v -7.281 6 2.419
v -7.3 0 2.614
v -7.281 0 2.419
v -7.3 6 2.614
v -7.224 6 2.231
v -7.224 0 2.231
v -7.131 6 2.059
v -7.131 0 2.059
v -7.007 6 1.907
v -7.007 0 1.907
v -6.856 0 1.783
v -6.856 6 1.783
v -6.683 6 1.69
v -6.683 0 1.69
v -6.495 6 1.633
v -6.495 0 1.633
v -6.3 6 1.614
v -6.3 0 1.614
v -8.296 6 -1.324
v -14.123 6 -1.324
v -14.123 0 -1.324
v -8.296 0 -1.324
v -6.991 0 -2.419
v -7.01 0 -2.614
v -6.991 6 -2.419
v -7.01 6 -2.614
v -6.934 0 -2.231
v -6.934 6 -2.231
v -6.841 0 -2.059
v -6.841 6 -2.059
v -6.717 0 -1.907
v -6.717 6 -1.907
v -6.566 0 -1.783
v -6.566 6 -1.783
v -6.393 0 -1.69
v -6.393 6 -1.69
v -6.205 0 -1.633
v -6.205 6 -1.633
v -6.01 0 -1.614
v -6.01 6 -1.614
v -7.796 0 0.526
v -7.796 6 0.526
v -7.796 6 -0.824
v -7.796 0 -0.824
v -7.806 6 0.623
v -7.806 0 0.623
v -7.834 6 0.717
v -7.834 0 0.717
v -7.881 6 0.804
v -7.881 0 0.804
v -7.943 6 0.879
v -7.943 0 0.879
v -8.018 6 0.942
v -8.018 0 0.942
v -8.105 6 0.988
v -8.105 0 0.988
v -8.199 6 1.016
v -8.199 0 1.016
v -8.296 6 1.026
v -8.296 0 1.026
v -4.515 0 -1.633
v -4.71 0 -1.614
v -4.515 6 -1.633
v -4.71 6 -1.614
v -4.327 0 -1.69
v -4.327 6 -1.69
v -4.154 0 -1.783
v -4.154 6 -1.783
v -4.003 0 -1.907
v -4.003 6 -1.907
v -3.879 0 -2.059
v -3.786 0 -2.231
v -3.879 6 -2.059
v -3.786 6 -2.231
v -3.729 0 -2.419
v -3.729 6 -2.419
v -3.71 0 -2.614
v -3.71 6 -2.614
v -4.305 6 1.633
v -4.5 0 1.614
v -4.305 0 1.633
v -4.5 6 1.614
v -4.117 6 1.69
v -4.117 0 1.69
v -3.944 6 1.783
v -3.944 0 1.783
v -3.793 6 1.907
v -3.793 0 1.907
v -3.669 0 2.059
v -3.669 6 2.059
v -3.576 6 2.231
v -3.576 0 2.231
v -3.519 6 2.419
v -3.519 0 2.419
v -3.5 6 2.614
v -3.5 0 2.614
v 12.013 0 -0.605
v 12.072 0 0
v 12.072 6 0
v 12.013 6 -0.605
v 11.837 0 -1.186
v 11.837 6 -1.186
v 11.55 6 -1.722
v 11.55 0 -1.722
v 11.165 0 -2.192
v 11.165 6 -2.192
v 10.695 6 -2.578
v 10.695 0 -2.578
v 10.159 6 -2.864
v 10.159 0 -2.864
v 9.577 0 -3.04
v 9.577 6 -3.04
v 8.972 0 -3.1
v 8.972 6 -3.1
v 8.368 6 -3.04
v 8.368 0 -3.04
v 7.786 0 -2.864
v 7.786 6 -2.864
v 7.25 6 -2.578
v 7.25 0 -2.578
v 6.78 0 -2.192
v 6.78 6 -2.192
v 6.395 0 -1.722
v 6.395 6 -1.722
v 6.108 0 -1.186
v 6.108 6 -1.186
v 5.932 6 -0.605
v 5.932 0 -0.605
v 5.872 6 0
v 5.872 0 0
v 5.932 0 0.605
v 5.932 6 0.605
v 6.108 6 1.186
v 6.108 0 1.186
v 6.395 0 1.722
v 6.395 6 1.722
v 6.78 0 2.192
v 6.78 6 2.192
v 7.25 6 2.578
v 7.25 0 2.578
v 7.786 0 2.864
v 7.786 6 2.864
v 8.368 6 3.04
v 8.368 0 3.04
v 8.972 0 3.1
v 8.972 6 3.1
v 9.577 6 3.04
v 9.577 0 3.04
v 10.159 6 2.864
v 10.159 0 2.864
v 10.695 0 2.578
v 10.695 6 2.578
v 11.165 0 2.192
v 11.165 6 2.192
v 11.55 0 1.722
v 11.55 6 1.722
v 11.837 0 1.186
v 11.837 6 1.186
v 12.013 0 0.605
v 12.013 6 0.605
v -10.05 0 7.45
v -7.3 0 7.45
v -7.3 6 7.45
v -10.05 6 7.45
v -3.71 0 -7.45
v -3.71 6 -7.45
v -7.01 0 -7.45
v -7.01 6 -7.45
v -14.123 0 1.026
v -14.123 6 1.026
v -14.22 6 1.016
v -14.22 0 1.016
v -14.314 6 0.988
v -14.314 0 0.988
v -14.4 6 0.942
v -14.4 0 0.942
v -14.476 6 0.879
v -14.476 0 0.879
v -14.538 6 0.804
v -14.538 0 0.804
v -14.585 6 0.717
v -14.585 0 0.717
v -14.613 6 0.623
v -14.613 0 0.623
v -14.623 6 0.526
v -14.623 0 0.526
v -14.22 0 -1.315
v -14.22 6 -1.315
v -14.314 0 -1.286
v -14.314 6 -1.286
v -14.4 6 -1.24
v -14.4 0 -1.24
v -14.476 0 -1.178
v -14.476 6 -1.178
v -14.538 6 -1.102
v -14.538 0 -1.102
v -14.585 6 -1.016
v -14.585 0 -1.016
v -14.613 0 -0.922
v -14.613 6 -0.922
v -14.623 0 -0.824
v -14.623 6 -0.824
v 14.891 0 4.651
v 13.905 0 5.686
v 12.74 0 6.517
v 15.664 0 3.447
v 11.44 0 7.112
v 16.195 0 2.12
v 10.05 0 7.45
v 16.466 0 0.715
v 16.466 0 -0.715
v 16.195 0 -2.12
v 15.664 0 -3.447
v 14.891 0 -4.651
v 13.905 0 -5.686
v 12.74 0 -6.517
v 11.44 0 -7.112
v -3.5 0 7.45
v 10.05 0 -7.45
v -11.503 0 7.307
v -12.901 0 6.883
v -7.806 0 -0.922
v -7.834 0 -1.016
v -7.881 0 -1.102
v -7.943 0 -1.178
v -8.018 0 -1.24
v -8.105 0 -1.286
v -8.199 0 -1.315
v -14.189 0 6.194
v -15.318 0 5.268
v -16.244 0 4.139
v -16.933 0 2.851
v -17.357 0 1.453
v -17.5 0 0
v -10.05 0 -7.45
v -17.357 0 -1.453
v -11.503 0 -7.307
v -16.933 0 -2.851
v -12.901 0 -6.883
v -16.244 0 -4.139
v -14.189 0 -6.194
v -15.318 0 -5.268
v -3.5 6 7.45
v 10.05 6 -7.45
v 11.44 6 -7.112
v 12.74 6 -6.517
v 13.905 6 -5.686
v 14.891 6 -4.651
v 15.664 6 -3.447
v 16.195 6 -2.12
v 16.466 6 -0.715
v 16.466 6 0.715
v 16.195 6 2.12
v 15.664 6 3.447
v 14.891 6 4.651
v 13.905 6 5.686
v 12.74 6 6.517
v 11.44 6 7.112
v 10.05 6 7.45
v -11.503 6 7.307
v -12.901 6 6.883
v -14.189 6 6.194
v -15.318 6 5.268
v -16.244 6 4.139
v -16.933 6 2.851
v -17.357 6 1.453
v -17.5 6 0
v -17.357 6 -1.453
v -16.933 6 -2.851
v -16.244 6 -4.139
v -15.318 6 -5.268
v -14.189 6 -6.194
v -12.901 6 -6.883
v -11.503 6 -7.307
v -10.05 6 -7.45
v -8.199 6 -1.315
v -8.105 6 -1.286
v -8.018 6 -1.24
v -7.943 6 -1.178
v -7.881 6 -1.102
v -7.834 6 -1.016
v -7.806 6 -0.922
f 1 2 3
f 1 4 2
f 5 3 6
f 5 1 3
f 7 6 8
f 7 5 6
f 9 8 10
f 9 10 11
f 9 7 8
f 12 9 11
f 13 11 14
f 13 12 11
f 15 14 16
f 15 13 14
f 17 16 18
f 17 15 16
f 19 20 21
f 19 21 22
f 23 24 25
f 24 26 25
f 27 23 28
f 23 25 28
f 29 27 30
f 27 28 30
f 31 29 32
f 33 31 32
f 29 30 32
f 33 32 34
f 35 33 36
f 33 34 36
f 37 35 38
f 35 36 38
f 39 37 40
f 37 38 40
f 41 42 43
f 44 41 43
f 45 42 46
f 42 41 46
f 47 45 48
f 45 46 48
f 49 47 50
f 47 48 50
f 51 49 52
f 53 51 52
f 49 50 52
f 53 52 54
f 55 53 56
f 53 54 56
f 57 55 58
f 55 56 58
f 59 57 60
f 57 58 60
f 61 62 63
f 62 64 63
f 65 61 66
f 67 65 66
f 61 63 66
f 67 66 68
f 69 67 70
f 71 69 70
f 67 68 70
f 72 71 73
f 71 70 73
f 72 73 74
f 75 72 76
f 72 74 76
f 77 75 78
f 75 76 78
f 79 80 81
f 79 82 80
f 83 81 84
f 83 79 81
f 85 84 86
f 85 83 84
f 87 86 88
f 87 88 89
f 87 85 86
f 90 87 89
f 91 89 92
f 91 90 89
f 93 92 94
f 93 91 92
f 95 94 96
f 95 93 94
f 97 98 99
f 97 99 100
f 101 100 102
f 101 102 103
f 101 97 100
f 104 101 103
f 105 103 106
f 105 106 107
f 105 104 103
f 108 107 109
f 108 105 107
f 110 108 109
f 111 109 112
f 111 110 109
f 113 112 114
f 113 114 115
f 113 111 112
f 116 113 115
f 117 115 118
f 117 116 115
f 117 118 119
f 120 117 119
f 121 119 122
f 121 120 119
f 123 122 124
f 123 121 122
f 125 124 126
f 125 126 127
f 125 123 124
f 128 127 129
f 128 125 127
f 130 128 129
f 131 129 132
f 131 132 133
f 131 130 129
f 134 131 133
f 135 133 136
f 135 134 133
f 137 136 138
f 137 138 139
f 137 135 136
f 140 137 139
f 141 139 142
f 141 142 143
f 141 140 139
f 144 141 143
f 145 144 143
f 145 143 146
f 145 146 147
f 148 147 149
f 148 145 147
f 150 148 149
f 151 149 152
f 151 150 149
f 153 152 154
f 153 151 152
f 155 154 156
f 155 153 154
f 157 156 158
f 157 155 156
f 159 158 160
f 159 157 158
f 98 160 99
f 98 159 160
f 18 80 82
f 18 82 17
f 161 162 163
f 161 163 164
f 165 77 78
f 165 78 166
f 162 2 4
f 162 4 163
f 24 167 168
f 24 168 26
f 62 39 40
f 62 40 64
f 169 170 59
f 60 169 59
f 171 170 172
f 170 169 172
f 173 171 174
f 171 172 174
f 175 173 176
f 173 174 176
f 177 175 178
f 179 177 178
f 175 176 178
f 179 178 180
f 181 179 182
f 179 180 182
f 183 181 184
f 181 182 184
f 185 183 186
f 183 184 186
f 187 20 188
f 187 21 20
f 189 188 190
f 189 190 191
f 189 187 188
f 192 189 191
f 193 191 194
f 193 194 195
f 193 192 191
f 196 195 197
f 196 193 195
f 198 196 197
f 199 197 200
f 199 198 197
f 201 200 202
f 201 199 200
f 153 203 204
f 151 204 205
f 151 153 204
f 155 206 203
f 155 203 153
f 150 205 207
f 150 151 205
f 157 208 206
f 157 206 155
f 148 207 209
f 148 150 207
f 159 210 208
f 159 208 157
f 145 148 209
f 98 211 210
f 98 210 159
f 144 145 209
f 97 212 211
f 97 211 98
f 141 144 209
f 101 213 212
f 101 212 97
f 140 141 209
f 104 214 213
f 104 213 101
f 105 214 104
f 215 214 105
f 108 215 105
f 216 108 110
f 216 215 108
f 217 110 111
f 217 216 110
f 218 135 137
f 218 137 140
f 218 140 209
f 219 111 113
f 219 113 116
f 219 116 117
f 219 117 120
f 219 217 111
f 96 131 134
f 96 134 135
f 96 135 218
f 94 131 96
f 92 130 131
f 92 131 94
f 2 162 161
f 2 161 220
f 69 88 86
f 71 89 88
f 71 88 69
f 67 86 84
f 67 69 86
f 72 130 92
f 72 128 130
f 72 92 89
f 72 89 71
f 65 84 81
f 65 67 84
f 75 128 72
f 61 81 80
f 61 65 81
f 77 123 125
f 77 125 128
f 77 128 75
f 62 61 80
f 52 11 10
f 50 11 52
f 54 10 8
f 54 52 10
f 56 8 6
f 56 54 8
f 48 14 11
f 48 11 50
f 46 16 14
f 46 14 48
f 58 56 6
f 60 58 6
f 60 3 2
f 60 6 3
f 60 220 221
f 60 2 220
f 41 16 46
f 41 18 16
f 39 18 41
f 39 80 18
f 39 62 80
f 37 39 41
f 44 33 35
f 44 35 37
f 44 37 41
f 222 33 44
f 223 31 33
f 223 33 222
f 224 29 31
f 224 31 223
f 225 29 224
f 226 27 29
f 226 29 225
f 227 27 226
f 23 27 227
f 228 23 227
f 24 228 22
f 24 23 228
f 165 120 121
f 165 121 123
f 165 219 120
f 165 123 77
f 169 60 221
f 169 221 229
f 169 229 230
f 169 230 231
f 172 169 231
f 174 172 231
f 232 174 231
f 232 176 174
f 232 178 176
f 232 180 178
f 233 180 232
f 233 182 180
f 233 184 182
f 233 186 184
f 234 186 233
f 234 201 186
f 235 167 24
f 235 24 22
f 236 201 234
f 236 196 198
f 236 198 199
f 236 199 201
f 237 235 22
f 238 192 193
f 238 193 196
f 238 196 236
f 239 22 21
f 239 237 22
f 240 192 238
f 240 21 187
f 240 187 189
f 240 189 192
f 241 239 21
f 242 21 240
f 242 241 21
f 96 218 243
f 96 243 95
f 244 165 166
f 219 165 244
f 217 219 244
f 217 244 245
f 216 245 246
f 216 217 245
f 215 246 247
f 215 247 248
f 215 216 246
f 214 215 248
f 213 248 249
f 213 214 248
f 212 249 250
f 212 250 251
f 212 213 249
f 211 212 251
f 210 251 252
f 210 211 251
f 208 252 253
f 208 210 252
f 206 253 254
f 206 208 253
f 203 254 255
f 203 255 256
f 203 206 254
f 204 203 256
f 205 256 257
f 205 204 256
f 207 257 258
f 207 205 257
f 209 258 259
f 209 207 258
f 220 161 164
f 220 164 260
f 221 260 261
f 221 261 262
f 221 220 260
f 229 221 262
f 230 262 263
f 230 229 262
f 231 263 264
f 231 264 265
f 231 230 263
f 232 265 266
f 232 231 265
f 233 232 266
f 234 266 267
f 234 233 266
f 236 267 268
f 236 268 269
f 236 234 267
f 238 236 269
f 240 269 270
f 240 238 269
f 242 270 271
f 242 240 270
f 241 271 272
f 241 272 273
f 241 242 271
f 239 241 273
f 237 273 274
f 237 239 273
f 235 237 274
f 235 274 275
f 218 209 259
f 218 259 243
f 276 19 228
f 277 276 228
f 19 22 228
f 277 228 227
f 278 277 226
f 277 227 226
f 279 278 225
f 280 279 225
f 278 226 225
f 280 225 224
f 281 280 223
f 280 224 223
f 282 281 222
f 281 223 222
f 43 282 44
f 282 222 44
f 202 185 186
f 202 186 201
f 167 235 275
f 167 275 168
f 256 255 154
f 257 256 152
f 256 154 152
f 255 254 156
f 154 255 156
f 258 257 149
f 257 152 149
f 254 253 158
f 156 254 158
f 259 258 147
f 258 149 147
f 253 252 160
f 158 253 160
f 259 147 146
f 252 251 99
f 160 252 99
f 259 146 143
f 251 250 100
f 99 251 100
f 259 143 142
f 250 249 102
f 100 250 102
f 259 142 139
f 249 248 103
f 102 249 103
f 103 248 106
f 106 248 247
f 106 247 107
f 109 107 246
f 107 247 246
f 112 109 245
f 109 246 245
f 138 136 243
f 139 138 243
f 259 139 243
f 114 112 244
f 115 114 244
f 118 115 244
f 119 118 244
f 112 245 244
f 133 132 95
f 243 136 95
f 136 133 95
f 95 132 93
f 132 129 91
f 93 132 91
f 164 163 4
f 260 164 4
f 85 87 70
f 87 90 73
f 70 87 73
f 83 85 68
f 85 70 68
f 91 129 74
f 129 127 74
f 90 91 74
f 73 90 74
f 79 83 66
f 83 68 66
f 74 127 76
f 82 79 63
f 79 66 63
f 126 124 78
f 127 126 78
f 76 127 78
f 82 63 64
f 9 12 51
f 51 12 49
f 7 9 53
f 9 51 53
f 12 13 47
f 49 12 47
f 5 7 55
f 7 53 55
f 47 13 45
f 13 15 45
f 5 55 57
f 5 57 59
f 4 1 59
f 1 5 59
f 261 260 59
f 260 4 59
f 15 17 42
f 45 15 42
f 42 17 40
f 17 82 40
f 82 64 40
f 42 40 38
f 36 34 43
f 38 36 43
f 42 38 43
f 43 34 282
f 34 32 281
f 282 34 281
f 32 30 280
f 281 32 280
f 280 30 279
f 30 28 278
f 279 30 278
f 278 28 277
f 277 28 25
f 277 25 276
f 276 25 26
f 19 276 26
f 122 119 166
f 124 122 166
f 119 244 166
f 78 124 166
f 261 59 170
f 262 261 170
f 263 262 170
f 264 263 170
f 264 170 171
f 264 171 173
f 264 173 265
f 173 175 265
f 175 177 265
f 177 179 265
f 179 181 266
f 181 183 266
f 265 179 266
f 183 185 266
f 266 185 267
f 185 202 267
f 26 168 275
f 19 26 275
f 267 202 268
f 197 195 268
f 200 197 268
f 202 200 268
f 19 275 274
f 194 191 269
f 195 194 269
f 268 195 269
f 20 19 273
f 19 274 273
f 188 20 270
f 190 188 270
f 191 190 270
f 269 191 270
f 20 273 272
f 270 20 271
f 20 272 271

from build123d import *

# Parameters (mm, degrees)
CROQUIS1_R              = 3.1
SALIENTE_EXTRUIR1_DEPTH = 6
CROQUIS2_W              = 6.826394781
CROQUIS2_H              = 2.350070334
CORTAR_EXTRUIR1_DEPTH   = 7
REDONDEO1_R             = 1
REDONDEO2_R             = 0.5


with BuildPart() as part:
    # Croquis1 → Saliente-Extruir1 (new body)
    with BuildSketch(Plane(origin=(0, 0, 0), x_dir=(1, 0, 0), z_dir=(0, 1, 0))):
        with BuildLine():
            Line((-10.05, 7.45), (-7.01, 7.45))
            Line((-7.01, 7.45), (-7.01, 1.614093831))
            Line((-7.01, 1.614093831), (-3.71, 1.614093831))
            Line((-3.71, 1.614093831), (-3.71, 7.45))
            Line((-3.71, 7.45), (10.05, 7.45))
            ThreePointArc((10.05, 7.45), (16.5, 0), (10.05, -7.45))
            Line((10.05, -7.45), (-3.5, -7.45))
            Line((-3.5, -7.45), (-3.5, -1.614093831))
            Line((-3.5, -1.614093831), (-7.3, -1.614093831))
            Line((-7.3, -1.614093831), (-7.3, -7.45))
            Line((-7.3, -7.45), (-10.05, -7.45))
            ThreePointArc((-10.05, -7.45), (-17.5, 0), (-10.05, 7.45))
        make_face()
        with Locations((8.97248062, 0)):
            Circle(CROQUIS1_R, mode=Mode.SUBTRACT)
    extrude(amount=SALIENTE_EXTRUIR1_DEPTH)

    # Croquis2 → Cortar-Extruir1 (cut)
    with BuildSketch(Plane(origin=(0, 6, 0), x_dir=(1, 0, 0), z_dir=(0, 1, 0))):
        with Locations((-11.209462468, 0.149210815)):
            Rectangle(CROQUIS2_W, CROQUIS2_H)
    extrude(amount=-CORTAR_EXTRUIR1_DEPTH, mode=Mode.SUBTRACT)

    # Redondeo1
    redondeo1_edges = [part.edges().sort_by_distance(p)[0] for p in [
        (-7.01, 3, -1.614093831),
        (-3.71, 3, -1.614093831),
        (-3.5, 3, 1.614093831),
        (-7.3, 3, 1.614093831),
    ]]
    fillet(redondeo1_edges, radius=REDONDEO1_R)

    # Redondeo2
    redondeo2_edges = [part.edges().sort_by_distance(p)[0] for p in [
        (-7.796265078, 3, -1.324245982),
        (-7.796265078, 3, 1.025824352),
        (-14.622659859, 3, 1.025824352),
        (-14.622659859, 3, -1.324245982),
    ]]
    fillet(redondeo2_edges, radius=REDONDEO2_R)


solid = part.part
